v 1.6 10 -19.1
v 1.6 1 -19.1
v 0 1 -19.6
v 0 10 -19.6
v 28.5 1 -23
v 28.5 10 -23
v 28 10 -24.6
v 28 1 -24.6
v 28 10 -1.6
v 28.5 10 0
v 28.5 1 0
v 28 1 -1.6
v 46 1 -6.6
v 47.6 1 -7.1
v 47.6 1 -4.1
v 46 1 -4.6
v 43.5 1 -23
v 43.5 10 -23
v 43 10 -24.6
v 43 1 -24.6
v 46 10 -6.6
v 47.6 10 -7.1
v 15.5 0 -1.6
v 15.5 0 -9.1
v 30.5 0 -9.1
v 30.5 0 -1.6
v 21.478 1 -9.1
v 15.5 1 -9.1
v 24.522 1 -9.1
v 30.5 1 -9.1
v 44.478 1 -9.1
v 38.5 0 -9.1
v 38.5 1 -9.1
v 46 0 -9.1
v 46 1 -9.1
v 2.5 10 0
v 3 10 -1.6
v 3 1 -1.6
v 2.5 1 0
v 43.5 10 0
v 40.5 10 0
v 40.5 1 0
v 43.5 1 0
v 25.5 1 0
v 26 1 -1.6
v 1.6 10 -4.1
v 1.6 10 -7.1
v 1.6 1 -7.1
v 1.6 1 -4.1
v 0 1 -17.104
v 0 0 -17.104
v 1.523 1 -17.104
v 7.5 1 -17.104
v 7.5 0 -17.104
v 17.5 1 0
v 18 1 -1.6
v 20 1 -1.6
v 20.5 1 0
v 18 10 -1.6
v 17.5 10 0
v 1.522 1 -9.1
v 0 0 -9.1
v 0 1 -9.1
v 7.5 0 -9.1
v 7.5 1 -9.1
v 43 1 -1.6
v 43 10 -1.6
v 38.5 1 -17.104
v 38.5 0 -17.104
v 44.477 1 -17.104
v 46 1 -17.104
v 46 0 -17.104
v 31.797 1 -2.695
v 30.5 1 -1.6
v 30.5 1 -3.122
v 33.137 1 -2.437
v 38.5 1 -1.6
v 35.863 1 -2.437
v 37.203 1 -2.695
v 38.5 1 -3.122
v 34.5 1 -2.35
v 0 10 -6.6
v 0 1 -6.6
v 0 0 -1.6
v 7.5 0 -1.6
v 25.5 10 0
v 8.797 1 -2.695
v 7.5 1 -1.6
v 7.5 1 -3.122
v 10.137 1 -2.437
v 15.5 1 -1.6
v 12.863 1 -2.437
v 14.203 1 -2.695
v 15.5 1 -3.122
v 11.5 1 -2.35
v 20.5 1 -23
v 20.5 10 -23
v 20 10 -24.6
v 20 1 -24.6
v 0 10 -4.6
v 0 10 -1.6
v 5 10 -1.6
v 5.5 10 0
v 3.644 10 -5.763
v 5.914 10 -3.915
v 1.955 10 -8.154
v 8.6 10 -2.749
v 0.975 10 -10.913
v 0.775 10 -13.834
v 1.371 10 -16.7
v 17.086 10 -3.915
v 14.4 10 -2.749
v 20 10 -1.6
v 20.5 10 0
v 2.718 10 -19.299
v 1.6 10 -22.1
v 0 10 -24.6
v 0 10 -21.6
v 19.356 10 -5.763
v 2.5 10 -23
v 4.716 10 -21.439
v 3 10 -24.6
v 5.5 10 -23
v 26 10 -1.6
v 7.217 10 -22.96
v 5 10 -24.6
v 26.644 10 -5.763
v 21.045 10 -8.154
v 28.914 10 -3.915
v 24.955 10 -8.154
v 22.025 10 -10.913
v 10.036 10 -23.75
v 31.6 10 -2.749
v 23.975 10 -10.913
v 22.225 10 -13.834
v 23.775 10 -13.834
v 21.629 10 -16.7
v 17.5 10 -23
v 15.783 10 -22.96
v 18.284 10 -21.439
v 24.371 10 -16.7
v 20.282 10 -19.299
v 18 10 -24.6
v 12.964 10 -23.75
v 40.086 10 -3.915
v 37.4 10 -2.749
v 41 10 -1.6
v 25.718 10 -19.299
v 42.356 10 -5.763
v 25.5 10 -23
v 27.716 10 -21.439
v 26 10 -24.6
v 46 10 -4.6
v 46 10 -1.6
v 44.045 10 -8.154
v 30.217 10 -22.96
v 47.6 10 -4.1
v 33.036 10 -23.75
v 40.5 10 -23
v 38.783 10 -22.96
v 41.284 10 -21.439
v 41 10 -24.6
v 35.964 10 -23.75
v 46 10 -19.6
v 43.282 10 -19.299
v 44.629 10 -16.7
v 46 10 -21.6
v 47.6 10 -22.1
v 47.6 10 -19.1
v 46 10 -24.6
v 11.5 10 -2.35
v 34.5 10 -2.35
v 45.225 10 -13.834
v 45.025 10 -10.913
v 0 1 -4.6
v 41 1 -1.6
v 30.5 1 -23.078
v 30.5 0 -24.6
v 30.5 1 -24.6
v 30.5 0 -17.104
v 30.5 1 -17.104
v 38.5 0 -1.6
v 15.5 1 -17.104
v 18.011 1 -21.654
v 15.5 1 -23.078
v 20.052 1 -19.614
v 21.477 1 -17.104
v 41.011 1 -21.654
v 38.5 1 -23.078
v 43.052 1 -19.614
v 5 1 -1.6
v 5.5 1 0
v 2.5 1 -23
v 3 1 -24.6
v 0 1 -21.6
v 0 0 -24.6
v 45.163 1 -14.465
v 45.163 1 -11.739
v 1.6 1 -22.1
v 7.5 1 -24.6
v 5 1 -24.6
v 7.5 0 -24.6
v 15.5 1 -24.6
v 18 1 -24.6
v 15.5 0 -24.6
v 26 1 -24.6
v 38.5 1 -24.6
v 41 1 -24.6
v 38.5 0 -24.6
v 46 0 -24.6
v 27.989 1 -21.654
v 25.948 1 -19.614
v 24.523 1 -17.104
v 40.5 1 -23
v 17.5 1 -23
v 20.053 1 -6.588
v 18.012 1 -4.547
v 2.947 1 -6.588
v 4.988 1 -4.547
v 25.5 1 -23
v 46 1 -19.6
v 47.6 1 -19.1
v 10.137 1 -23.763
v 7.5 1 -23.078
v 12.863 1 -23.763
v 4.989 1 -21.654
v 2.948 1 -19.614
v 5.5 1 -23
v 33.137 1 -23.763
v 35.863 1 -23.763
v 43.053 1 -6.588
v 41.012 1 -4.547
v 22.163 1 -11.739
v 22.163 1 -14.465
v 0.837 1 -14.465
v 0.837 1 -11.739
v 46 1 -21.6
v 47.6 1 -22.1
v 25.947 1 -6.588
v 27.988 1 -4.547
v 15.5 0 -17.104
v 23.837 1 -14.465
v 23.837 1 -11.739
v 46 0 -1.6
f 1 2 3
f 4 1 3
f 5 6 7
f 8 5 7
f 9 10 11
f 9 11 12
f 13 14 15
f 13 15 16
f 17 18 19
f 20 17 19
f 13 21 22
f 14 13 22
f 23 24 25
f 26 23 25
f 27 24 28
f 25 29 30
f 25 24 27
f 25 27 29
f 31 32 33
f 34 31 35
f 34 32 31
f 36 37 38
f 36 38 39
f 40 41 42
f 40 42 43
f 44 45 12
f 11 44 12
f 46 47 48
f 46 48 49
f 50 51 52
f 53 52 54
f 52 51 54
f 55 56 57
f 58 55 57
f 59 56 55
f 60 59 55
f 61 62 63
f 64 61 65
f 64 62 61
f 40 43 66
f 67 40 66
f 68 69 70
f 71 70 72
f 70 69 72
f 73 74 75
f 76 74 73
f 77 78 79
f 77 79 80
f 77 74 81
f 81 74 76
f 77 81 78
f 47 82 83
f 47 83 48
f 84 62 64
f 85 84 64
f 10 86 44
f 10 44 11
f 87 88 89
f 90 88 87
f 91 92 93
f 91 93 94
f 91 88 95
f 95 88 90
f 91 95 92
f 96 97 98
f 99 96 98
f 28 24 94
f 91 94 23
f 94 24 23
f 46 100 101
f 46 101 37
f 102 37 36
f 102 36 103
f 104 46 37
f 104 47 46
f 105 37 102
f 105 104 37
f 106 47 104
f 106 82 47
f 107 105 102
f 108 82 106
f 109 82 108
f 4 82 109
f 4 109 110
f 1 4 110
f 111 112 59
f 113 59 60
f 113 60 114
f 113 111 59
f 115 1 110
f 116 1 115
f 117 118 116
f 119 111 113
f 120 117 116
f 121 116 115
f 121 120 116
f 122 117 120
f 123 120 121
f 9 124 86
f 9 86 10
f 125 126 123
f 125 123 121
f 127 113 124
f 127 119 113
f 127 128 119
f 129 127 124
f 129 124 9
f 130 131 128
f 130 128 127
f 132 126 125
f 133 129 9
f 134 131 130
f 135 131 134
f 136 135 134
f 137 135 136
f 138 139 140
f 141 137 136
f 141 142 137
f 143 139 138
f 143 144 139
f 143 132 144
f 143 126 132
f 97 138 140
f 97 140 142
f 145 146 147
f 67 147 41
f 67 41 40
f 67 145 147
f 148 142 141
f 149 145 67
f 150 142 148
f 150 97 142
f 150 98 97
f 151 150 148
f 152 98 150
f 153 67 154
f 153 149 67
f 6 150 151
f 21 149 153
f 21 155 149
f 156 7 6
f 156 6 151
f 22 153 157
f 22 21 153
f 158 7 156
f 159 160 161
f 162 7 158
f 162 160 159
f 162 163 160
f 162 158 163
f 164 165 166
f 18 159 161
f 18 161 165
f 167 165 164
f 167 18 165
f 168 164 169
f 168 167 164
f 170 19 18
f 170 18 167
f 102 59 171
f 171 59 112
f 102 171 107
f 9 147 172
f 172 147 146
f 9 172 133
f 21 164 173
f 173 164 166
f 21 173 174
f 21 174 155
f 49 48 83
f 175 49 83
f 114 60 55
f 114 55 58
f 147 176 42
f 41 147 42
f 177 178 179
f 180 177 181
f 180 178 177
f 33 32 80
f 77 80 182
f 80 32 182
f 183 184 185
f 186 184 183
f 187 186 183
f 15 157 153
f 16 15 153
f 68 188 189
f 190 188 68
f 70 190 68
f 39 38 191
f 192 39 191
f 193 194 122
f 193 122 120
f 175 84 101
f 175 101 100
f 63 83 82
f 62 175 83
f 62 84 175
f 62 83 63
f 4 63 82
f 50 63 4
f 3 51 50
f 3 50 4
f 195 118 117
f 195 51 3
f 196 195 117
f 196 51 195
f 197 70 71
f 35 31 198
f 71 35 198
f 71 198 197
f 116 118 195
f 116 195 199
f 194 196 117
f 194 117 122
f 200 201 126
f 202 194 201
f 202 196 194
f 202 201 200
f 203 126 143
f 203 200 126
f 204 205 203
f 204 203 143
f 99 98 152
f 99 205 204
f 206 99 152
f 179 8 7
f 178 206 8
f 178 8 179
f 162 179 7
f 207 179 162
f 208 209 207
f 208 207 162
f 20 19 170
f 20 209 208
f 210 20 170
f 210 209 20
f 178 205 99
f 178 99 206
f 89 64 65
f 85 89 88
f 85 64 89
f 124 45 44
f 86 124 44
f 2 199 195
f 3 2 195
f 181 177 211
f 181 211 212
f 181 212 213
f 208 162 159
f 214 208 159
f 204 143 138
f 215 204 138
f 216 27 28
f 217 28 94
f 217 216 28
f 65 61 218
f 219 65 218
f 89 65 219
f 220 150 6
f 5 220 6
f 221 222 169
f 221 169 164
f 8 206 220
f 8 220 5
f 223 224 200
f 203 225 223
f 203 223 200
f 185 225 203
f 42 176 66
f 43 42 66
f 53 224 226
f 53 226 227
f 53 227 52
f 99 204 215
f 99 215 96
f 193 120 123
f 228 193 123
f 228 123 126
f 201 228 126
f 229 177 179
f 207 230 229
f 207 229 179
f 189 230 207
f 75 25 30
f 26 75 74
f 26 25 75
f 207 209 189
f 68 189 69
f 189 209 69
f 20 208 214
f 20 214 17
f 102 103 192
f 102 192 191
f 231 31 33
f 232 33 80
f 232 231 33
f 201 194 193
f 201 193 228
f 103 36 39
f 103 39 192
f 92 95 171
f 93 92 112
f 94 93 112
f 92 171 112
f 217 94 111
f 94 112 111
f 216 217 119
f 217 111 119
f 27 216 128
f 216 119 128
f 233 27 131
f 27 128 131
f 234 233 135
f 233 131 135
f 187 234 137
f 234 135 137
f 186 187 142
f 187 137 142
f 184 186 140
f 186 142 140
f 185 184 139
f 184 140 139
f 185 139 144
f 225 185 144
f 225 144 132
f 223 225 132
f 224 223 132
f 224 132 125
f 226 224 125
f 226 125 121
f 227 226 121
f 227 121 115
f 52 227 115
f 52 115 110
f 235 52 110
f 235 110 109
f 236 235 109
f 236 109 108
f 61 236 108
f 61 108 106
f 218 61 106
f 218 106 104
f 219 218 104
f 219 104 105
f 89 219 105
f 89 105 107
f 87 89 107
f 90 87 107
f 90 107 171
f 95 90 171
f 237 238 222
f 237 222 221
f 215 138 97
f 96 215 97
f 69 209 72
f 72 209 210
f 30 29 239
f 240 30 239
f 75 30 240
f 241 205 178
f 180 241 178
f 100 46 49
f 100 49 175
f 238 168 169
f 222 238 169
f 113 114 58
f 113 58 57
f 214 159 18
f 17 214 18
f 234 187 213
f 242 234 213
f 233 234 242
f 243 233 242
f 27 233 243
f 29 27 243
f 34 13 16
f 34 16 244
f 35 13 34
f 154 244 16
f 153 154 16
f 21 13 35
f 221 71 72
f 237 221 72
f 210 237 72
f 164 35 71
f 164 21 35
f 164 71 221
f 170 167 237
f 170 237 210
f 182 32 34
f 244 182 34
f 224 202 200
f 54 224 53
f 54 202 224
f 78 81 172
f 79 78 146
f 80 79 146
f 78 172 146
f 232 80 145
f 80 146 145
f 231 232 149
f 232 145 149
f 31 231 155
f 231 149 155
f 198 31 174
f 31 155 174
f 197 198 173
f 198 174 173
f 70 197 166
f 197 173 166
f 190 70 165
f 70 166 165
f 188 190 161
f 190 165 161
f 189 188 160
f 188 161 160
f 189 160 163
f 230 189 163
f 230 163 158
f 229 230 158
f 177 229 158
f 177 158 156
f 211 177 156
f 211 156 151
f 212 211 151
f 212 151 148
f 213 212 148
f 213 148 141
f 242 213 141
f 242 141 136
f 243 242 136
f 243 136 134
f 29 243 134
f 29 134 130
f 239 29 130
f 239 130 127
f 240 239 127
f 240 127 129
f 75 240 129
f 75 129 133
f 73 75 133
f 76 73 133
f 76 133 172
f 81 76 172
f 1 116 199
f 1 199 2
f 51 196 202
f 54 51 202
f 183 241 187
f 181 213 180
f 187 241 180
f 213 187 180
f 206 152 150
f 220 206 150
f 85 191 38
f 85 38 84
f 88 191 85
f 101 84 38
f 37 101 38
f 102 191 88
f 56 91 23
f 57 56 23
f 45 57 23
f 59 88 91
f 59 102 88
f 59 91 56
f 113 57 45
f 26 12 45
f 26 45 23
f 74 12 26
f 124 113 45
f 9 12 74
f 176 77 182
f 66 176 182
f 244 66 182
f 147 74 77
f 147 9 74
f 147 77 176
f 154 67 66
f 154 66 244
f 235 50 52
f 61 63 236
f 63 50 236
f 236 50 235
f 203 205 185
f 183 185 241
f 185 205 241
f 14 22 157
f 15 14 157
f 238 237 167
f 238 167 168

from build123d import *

# Parameters (mm, degrees)
SKETCH1_W           = 47.6
SKETCH1_H           = 24.6
BOSS_EXTRUDE1_DEPTH = 10
SKETCH2_R           = 10.75
CUT_EXTRUDE1_DEPTH  = 9
CUT_EXTRUDE2_DEPTH  = 9
SKETCH5_W           = 1.6
SKETCH5_H           = 24.6
CUT_EXTRUDE3_DEPTH  = 10
SKETCH6_W           = 46
SKETCH6_H           = 1.6
CUT_EXTRUDE4_DEPTH  = 10
BOSS_EXTRUDE2_DEPTH = 9
SKETCH10_W          = 46
SKETCH10_H          = 8.003908937
CUT_EXTRUDE5_DEPTH  = 1
SKETCH11_W          = 8
SKETCH11_H          = 23
CUT_EXTRUDE6_DEPTH  = 1


with BuildPart() as part:
    # Sketch1 → Boss-Extrude1 (new body)
    with BuildSketch(Plane(origin=(0, 0, 0), x_dir=(1, 0, 0), z_dir=(0, 1, 0))):
        with Locations((23.8, 12.3)):
            Rectangle(SKETCH1_W, SKETCH1_H)
    extrude(amount=BOSS_EXTRUDE1_DEPTH)

    # Sketch2 → Cut-Extrude1 (cut)
    with BuildSketch(Plane(origin=(0, 10, 0), x_dir=(1, 0, 0), z_dir=(0, 1, 0))):
        with Locations(Location((11.5, 13.1, 0), (0, 0, 270))):
            Circle(SKETCH2_R)
        with Locations(Location((34.5, 13.1, 0), (0, 0, 270))):
            Circle(SKETCH2_R)
    extrude(amount=-CUT_EXTRUDE1_DEPTH, mode=Mode.SUBTRACT)

    # Sketch3 → Cut-Extrude2 (cut)
    with BuildSketch(Plane(origin=(0, 10, 0), x_dir=(1, 0, 0), z_dir=(0, 1, 0))):
        Polygon((3, 24.6), (2.5, 23), (5.5, 23), (5, 24.6), align=None)
        Polygon((18, 24.6), (17.5, 23), (20.5, 23), (20, 24.6), align=None)
        Polygon((26, 24.6), (25.5, 23), (28.5, 23), (28, 24.6), align=None)
        Polygon((41, 24.6), (40.5, 23), (43.5, 23), (43, 24.6), align=None)
        Polygon((0, 21.6), (1.6, 22.1), (1.6, 19.1), (0, 19.6), align=None)
        Polygon((0, 6.6), (1.6, 7.1), (1.6, 4.1), (0, 4.6), align=None)
    extrude(amount=-CUT_EXTRUDE2_DEPTH, mode=Mode.SUBTRACT)

    # Sketch5 → Cut-Extrude3 (cut)
    with BuildSketch(Plane(origin=(0, 10, 0), x_dir=(1, 0, 0), z_dir=(0, 1, 0))):
        with Locations((46.8, 12.3)):
            Rectangle(SKETCH5_W, SKETCH5_H)
    extrude(amount=-CUT_EXTRUDE3_DEPTH, mode=Mode.SUBTRACT)

    # Sketch6 → Cut-Extrude4 (cut)
    with BuildSketch(Plane(origin=(0, 10, 0), x_dir=(1, 0, 0), z_dir=(0, 1, 0))):
        with Locations((23, 0.8)):
            Rectangle(SKETCH6_W, SKETCH6_H)
    extrude(amount=-CUT_EXTRUDE4_DEPTH, mode=Mode.SUBTRACT)

    # Sketch7 → Boss-Extrude2 (add)
    with BuildSketch(Plane(origin=(0, 10, 0), x_dir=(1, 0, 0), z_dir=(0, 1, 0))):
        Polygon((46, 21.6), (47.6, 22.1), (47.6, 19.1), (46, 19.6), align=None)
        Polygon((46, 6.6), (47.6, 7.1), (47.6, 4.1), (46, 4.6), align=None)
        Polygon((3, 1.6), (2.5, 0), (5.5, 0), (5, 1.6), align=None)
        Polygon((18, 1.6), (17.5, 0), (20.5, 0), (20, 1.6), align=None)
        Polygon((26, 1.6), (25.5, 0), (28.5, 0), (28, 1.6), align=None)
        Polygon((41, 1.6), (40.5, 0), (43.5, 0), (43, 1.6), align=None)
    extrude(amount=-BOSS_EXTRUDE2_DEPTH)

    # Sketch10 → Cut-Extrude5 (cut)
    with BuildSketch(Plane.XZ):
        with Locations((23, -13.101954469)):
            Rectangle(SKETCH10_W, SKETCH10_H)
    extrude(amount=-CUT_EXTRUDE5_DEPTH, mode=Mode.SUBTRACT)

    # Sketch11 → Cut-Extrude6 (cut)
    with BuildSketch(Plane.XZ):
        with Locations((11.5, -13.1)):
            Rectangle(SKETCH11_W, SKETCH11_H)
        with Locations((34.5, -13.1)):
            Rectangle(SKETCH11_W, SKETCH11_H)
    extrude(amount=-CUT_EXTRUDE6_DEPTH, mode=Mode.SUBTRACT)


solid = part.part
